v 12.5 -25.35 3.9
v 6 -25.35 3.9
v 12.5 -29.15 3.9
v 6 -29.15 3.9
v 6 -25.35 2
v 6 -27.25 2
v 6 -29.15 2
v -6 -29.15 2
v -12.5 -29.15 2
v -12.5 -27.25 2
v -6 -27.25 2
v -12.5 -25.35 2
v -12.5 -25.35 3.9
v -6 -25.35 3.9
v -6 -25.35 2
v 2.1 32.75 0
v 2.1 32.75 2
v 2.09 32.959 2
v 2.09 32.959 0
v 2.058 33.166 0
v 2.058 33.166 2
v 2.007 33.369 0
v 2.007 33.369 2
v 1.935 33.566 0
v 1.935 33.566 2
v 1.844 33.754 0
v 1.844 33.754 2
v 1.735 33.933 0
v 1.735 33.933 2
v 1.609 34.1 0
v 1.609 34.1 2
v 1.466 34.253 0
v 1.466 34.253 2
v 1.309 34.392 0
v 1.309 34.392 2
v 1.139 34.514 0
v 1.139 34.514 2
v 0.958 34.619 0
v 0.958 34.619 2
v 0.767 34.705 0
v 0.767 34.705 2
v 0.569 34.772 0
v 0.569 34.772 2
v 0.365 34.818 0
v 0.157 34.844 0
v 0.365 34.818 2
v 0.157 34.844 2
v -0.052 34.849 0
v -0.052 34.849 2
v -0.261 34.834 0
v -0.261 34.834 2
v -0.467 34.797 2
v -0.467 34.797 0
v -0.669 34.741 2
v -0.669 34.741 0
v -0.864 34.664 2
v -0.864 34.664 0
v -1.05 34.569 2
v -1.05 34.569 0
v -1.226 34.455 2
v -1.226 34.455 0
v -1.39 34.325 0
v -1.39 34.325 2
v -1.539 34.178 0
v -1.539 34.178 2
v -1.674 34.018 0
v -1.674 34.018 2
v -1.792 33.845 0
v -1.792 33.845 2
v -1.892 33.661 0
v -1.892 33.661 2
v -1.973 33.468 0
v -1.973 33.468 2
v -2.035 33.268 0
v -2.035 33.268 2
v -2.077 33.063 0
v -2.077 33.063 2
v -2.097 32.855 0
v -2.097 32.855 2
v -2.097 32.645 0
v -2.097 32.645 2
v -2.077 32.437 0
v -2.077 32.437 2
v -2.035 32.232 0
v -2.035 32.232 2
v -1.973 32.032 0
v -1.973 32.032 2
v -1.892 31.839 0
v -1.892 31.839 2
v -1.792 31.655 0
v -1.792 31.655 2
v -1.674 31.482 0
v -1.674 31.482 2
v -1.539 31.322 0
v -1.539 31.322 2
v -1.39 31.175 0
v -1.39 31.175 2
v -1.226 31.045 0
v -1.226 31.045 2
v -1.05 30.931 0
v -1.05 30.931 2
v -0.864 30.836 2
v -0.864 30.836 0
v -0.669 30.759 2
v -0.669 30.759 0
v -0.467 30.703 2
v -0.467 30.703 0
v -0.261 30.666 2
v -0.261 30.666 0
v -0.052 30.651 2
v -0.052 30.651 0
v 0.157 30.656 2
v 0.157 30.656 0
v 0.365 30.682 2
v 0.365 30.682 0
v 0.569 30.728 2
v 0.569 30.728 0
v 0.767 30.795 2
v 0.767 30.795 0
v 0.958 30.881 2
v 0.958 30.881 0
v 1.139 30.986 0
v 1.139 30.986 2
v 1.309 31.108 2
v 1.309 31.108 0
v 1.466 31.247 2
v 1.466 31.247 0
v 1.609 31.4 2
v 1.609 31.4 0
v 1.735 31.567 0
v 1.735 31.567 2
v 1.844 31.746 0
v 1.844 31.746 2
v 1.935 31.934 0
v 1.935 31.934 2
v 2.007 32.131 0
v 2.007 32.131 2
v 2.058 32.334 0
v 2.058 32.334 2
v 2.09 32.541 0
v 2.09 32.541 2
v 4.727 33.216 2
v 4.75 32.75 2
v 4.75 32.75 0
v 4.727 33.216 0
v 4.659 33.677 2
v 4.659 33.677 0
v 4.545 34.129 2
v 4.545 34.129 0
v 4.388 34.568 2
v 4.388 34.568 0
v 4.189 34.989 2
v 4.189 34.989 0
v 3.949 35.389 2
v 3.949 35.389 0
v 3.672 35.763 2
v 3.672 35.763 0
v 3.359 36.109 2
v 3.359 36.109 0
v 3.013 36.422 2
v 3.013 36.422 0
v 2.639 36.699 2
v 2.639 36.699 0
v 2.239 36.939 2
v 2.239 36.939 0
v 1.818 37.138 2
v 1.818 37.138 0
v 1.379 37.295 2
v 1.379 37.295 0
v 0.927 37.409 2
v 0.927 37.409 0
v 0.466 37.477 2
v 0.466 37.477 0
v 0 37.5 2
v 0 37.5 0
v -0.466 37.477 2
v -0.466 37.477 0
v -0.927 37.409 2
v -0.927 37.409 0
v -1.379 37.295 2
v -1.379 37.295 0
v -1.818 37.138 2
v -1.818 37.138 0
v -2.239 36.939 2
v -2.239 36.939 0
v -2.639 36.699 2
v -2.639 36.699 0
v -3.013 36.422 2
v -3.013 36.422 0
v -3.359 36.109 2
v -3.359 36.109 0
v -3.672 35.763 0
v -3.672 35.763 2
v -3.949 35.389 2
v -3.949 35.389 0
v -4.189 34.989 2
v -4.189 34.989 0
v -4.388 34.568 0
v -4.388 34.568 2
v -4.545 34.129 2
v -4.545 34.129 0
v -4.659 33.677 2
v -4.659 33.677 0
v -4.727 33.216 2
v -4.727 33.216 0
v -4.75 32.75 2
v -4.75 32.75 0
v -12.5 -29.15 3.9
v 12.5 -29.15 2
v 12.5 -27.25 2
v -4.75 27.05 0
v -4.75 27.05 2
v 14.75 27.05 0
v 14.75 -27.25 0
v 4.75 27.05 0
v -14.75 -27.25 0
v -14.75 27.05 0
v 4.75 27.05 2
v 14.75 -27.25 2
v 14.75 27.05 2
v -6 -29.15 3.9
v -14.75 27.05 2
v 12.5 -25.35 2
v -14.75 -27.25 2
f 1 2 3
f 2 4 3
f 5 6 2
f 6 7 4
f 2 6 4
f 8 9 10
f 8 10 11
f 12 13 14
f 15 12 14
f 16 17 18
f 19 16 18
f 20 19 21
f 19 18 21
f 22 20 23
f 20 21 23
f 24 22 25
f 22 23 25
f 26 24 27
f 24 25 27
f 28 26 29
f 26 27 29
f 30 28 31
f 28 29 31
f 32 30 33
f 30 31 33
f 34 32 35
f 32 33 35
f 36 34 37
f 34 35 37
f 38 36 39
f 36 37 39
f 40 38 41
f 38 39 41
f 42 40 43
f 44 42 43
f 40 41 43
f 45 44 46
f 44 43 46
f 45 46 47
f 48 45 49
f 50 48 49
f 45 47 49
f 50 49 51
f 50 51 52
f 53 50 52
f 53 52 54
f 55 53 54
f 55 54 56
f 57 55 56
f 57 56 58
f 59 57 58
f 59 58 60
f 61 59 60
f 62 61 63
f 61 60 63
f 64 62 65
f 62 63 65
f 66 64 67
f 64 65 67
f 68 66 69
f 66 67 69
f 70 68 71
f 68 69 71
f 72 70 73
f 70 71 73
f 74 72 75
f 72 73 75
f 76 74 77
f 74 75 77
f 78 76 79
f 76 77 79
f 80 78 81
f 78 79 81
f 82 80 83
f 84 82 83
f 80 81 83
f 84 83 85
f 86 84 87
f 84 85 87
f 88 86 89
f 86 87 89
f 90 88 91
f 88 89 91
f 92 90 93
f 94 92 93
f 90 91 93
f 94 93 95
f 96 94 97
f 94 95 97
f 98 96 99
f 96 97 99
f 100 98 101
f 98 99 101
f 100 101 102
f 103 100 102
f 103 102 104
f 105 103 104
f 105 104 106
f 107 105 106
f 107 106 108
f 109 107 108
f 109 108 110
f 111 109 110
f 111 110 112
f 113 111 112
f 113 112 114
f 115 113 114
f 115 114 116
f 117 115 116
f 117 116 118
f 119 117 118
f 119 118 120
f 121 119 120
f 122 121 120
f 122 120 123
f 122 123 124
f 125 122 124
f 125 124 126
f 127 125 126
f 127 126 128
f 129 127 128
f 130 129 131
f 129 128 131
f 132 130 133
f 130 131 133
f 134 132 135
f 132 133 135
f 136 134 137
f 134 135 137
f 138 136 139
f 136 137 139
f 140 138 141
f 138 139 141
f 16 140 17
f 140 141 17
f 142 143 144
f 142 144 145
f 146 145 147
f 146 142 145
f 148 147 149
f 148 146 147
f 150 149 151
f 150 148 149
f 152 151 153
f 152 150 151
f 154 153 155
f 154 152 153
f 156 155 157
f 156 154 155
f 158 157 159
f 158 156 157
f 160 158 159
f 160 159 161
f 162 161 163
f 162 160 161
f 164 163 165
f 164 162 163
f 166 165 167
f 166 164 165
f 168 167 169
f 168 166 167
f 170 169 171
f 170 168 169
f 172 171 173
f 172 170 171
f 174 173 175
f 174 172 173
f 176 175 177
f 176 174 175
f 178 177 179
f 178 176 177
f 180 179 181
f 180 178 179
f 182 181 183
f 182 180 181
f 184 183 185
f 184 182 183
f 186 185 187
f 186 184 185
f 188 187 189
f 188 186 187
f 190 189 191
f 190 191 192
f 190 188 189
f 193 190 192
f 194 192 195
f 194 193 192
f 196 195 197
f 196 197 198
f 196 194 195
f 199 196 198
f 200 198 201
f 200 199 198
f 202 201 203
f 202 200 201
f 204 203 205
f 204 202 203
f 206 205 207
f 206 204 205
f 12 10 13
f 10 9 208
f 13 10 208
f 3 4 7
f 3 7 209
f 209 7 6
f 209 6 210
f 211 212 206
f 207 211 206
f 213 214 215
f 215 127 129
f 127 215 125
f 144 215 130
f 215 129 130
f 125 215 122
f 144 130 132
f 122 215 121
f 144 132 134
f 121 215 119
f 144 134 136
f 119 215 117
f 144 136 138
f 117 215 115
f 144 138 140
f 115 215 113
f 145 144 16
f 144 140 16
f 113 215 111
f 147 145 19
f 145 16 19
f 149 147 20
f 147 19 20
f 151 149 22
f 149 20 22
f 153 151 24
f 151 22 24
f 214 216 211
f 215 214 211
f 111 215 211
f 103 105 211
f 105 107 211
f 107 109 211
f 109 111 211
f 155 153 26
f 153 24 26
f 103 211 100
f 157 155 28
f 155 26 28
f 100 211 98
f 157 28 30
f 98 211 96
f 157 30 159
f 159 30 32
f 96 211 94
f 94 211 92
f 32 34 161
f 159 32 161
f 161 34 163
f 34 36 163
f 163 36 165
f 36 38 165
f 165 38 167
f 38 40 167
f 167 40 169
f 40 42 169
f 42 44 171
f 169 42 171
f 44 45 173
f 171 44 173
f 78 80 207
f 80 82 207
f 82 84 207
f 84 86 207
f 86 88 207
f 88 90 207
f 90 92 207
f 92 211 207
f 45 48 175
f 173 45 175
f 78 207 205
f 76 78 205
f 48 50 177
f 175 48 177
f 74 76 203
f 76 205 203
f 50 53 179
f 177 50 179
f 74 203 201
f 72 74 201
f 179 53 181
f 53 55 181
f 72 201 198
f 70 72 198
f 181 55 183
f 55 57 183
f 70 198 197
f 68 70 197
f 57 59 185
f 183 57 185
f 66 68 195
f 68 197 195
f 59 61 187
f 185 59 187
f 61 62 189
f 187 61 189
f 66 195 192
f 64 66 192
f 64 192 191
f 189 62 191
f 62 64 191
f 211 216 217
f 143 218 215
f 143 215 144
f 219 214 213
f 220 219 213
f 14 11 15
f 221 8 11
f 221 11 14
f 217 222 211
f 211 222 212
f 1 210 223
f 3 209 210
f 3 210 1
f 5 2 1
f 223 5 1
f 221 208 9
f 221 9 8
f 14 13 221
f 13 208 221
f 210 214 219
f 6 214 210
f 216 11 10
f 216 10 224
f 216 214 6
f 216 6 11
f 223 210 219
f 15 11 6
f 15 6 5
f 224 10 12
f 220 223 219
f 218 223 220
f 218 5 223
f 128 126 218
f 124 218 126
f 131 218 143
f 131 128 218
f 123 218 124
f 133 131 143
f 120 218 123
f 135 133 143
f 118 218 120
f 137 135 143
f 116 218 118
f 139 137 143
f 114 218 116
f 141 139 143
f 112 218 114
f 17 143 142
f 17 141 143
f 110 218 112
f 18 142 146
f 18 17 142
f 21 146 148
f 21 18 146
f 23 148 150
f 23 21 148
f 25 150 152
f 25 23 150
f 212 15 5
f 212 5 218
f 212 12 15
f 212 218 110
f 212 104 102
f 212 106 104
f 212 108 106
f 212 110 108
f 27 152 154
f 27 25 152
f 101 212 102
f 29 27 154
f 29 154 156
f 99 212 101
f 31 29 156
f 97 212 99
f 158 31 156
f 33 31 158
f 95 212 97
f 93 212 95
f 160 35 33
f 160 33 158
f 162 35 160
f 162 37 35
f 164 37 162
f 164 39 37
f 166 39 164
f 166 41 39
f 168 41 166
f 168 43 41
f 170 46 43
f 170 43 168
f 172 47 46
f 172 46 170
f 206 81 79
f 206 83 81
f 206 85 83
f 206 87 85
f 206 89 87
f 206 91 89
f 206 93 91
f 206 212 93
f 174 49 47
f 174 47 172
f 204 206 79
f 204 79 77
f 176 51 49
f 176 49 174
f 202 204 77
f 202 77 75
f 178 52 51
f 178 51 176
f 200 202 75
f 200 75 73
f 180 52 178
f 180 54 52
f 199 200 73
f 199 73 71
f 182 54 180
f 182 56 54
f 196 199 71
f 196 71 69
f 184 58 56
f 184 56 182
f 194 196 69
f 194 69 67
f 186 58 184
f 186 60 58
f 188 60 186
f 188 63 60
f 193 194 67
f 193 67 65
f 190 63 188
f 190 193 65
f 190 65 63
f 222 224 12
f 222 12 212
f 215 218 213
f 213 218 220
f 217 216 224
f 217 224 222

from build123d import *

# Parameters (mm, degrees)
SKETCH1_W           = 54.5
SKETCH1_H           = 29.5
BOSS_EXTRUDE1_DEPTH = 2
SKETCH2_W           = 6.5
SKETCH2_H           = 1.9
BOSS_EXTRUDE2_DEPTH = 1.9
SKETCH4_W           = 6.5
SKETCH4_H           = 1.9
BOSS_EXTRUDE3_DEPTH = 1.9
SKETCH5_R           = 2.1
BOSS_EXTRUDE4_DEPTH = 2
SKETCH6_W           = 15.900329316
SKETCH6_H           = 0.2
SKETCH6_W_2         = 14.215882728
CUT_EXTRUDE1_DEPTH  = 10


with BuildPart() as part:
    # Sketch1 → Boss-Extrude1 (new body)
    with BuildSketch(Plane(origin=(0, 0, 0), x_dir=(0, 1, 0), z_dir=(0, 0, 1))):
        Rectangle(SKETCH1_W, SKETCH1_H)
    extrude(amount=BOSS_EXTRUDE1_DEPTH)

    # Sketch2 → Boss-Extrude2 (add, symmetric)
    with BuildSketch(Plane.XZ.offset(27.25)):
        with Locations((-9.25, 2.95)):
            Rectangle(SKETCH2_W, SKETCH2_H)
    extrude(amount=BOSS_EXTRUDE2_DEPTH, both=True)

    # Sketch4 → Boss-Extrude3 (add, symmetric)
    with BuildSketch(Plane.XZ.offset(27.25)):
        with Locations((9.25, 2.95)):
            Rectangle(SKETCH4_W, SKETCH4_H)
    extrude(amount=BOSS_EXTRUDE3_DEPTH, both=True)

    # Sketch5 → Boss-Extrude4 (add)
    with BuildSketch(Plane.XY.offset(2)):
        with BuildLine():
            Line((-4.75, 32.75), (-4.75, 27.25))
            Line((-4.75, 27.25), (4.75, 27.25))
            Line((4.75, 27.25), (4.75, 32.75))
            ThreePointArc((4.75, 32.75), (0, 37.5), (-4.75, 32.75))
        make_face()
        with Locations((0, 32.75)):
            Circle(SKETCH5_R, mode=Mode.SUBTRACT)
    extrude(amount=-BOSS_EXTRUDE4_DEPTH)

    # Sketch6 → Cut-Extrude1 (cut)
    with BuildSketch(Plane.XY.offset(2)):
        with Locations((-12.700164658, 27.15)):
            Rectangle(SKETCH6_W, SKETCH6_H)
        with Locations((11.857941364, 27.15)):
            Rectangle(SKETCH6_W_2, SKETCH6_H)
    extrude(amount=-CUT_EXTRUDE1_DEPTH, mode=Mode.SUBTRACT)


solid = part.part
